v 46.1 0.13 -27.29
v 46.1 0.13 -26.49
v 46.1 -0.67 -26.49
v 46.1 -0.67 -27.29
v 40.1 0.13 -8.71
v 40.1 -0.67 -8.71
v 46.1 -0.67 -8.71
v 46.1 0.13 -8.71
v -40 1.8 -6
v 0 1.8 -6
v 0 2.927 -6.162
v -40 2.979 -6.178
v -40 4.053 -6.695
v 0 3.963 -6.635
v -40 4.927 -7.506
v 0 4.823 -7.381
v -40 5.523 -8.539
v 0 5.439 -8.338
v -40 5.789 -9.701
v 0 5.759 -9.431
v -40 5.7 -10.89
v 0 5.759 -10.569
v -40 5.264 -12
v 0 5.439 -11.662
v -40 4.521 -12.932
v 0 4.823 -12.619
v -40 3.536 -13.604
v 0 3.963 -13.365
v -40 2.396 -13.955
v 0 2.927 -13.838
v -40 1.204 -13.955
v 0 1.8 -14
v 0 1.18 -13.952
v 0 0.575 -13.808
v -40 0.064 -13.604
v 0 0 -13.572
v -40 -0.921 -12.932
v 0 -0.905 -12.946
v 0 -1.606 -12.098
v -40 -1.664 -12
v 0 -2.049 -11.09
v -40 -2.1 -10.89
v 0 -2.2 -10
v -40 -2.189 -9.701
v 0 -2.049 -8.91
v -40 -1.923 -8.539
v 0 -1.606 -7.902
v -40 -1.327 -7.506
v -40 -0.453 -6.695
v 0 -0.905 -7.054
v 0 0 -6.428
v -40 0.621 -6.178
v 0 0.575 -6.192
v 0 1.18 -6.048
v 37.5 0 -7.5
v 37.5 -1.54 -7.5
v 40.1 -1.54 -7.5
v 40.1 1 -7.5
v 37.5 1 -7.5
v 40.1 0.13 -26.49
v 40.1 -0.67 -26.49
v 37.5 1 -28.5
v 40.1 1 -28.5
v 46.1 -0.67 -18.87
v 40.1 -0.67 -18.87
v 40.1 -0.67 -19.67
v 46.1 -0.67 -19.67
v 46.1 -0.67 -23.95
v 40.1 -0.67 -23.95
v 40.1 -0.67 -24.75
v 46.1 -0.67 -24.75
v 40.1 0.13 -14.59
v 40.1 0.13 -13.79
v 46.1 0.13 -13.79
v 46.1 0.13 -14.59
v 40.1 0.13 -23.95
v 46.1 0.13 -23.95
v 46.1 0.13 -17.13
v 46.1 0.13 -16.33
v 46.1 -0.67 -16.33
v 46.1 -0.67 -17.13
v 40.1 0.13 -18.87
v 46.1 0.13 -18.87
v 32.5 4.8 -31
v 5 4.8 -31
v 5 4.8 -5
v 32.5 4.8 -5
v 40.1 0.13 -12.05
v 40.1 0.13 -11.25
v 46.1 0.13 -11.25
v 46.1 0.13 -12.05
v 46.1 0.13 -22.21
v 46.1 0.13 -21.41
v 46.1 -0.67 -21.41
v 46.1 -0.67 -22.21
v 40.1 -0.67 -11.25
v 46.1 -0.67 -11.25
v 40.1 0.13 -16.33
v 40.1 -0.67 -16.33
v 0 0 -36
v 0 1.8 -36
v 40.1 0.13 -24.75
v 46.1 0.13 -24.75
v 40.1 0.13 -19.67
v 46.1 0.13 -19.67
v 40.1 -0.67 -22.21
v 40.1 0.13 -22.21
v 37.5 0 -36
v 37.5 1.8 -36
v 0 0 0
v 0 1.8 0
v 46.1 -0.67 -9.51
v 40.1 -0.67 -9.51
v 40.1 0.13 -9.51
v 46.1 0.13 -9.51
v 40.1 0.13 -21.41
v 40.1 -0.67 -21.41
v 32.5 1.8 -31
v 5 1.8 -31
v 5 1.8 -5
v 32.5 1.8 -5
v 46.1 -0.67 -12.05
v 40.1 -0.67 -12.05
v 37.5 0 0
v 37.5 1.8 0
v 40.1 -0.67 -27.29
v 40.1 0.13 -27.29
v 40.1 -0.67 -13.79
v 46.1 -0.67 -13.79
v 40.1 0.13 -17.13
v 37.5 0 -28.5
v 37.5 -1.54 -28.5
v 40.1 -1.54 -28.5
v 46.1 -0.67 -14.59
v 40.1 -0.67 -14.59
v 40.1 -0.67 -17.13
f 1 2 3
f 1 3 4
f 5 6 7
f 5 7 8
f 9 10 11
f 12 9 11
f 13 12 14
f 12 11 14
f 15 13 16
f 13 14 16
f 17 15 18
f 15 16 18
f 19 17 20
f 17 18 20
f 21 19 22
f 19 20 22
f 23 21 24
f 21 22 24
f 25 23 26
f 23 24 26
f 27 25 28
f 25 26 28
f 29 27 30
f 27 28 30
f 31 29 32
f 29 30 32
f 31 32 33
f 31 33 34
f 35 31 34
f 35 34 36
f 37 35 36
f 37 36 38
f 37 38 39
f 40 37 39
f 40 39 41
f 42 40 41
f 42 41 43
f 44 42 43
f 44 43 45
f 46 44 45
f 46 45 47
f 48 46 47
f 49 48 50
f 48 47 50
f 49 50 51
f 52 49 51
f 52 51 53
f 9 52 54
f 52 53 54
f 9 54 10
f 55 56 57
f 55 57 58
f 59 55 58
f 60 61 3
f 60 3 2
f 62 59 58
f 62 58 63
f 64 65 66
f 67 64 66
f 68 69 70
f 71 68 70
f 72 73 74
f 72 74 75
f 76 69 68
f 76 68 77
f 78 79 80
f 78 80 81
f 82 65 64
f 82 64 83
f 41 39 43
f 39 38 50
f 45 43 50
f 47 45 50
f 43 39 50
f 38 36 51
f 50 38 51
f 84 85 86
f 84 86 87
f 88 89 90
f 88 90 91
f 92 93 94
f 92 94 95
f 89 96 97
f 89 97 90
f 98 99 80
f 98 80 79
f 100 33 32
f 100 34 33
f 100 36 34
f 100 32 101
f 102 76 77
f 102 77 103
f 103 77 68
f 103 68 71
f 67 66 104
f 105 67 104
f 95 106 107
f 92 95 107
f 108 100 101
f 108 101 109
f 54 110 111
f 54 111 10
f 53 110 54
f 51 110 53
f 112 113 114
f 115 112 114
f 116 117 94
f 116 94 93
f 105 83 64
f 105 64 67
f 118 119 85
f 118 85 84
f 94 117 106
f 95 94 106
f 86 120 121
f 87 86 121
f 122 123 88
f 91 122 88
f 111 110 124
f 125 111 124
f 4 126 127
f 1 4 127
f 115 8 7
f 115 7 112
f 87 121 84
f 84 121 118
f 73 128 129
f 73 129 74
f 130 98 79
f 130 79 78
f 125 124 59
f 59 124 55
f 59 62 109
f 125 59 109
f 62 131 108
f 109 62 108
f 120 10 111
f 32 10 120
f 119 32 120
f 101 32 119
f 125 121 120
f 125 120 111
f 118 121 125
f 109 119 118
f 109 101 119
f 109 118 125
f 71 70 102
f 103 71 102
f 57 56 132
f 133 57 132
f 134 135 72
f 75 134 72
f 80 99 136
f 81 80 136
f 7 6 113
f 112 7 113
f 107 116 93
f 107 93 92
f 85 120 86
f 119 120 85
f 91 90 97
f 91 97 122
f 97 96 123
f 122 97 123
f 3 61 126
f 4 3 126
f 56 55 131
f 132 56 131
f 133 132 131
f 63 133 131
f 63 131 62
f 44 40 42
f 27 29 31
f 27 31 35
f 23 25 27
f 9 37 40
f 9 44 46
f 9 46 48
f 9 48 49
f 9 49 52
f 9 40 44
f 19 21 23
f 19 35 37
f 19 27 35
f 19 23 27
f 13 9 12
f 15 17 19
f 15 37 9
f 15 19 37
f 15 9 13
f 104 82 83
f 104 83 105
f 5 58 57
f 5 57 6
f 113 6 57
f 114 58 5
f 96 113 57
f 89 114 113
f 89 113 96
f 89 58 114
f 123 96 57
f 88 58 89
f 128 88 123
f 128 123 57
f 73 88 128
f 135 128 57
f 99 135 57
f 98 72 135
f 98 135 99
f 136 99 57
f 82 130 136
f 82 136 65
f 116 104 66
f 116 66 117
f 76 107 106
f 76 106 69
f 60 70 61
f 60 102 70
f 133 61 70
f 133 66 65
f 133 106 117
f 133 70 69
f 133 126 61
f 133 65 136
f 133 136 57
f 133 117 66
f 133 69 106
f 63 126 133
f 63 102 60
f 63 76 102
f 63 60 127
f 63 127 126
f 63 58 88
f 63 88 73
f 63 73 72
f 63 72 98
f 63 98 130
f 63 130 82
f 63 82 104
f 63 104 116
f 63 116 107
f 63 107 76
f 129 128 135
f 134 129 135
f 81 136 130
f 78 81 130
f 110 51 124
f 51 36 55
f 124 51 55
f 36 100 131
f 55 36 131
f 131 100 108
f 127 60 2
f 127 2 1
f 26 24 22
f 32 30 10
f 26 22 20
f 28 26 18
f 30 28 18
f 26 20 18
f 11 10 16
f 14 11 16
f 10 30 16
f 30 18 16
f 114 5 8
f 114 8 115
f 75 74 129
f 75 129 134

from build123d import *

# Parameters (mm, degrees)
CROQUIS1_W              = 37.5
CROQUIS1_H              = 36
SALIENTE_EXTRUIR1_DEPTH = 1.8
CROQUIS2_W              = 27.5
CROQUIS2_H              = 26
SALIENTE_EXTRUIR2_DEPTH = 3
CROQUIS3_W              = 21
CROQUIS3_H              = 2.54
SALIENTE_EXTRUIR3_DEPTH = 2.6
CROQUIS4_W              = 0.8
CROQUIS4_H              = 0.8
SALIENTE_EXTRUIR4_DEPTH = 6
CROQUIS5_R              = 4
SALIENTE_EXTRUIR5_DEPTH = 40


with BuildPart() as part:
    # Croquis1 → Saliente-Extruir1 (new body)
    with BuildSketch(Plane(origin=(0, 0, 0), x_dir=(1, 0, 0), z_dir=(0, 1, 0))):
        with Locations((18.75, 18)):
            Rectangle(CROQUIS1_W, CROQUIS1_H)
    extrude(amount=SALIENTE_EXTRUIR1_DEPTH)

    # Croquis2 → Saliente-Extruir2 (add)
    with BuildSketch(Plane(origin=(0, 1.8, 0), x_dir=(1, 0, 0), z_dir=(0, 1, 0))):
        with Locations((18.75, 18)):
            Rectangle(CROQUIS2_W, CROQUIS2_H)
    extrude(amount=SALIENTE_EXTRUIR2_DEPTH)

    # Croquis3 → Saliente-Extruir3 (add)
    with BuildSketch(Plane(origin=(37.5, 0, 0), x_dir=(0, 0, -1), z_dir=(1, 0, 0))):
        with Locations((18, -0.27)):
            Rectangle(CROQUIS3_W, CROQUIS3_H)
    extrude(amount=SALIENTE_EXTRUIR3_DEPTH)

    # Croquis4 → Saliente-Extruir4 (add)
    with BuildSketch(Plane(origin=(40.1, 0, 0), x_dir=(0, 0, -1), z_dir=(1, 0, 0))):
        with Locations((21.81, -0.27)):
            Rectangle(CROQUIS4_W, CROQUIS4_H)
        with Locations((19.27, -0.27)):
            Rectangle(CROQUIS4_W, CROQUIS4_H)
        with Locations((16.73, -0.27)):
            Rectangle(CROQUIS4_W, CROQUIS4_H)
        with Locations((24.35, -0.27)):
            Rectangle(CROQUIS4_W, CROQUIS4_H)
        with Locations((26.89, -0.27)):
            Rectangle(CROQUIS4_W, CROQUIS4_H)
        with Locations((14.19, -0.27)):
            Rectangle(CROQUIS4_W, CROQUIS4_H)
        with Locations((11.65, -0.27)):
            Rectangle(CROQUIS4_W, CROQUIS4_H)
        with Locations((9.11, -0.27)):
            Rectangle(CROQUIS4_W, CROQUIS4_H)
    extrude(amount=SALIENTE_EXTRUIR4_DEPTH)

    # Croquis5 → Saliente-Extruir5 (add)
    with BuildSketch(Plane.ZY):
        with Locations((-10, 1.8)):
            Circle(CROQUIS5_R)
    extrude(amount=SALIENTE_EXTRUIR5_DEPTH)


solid = part.part
